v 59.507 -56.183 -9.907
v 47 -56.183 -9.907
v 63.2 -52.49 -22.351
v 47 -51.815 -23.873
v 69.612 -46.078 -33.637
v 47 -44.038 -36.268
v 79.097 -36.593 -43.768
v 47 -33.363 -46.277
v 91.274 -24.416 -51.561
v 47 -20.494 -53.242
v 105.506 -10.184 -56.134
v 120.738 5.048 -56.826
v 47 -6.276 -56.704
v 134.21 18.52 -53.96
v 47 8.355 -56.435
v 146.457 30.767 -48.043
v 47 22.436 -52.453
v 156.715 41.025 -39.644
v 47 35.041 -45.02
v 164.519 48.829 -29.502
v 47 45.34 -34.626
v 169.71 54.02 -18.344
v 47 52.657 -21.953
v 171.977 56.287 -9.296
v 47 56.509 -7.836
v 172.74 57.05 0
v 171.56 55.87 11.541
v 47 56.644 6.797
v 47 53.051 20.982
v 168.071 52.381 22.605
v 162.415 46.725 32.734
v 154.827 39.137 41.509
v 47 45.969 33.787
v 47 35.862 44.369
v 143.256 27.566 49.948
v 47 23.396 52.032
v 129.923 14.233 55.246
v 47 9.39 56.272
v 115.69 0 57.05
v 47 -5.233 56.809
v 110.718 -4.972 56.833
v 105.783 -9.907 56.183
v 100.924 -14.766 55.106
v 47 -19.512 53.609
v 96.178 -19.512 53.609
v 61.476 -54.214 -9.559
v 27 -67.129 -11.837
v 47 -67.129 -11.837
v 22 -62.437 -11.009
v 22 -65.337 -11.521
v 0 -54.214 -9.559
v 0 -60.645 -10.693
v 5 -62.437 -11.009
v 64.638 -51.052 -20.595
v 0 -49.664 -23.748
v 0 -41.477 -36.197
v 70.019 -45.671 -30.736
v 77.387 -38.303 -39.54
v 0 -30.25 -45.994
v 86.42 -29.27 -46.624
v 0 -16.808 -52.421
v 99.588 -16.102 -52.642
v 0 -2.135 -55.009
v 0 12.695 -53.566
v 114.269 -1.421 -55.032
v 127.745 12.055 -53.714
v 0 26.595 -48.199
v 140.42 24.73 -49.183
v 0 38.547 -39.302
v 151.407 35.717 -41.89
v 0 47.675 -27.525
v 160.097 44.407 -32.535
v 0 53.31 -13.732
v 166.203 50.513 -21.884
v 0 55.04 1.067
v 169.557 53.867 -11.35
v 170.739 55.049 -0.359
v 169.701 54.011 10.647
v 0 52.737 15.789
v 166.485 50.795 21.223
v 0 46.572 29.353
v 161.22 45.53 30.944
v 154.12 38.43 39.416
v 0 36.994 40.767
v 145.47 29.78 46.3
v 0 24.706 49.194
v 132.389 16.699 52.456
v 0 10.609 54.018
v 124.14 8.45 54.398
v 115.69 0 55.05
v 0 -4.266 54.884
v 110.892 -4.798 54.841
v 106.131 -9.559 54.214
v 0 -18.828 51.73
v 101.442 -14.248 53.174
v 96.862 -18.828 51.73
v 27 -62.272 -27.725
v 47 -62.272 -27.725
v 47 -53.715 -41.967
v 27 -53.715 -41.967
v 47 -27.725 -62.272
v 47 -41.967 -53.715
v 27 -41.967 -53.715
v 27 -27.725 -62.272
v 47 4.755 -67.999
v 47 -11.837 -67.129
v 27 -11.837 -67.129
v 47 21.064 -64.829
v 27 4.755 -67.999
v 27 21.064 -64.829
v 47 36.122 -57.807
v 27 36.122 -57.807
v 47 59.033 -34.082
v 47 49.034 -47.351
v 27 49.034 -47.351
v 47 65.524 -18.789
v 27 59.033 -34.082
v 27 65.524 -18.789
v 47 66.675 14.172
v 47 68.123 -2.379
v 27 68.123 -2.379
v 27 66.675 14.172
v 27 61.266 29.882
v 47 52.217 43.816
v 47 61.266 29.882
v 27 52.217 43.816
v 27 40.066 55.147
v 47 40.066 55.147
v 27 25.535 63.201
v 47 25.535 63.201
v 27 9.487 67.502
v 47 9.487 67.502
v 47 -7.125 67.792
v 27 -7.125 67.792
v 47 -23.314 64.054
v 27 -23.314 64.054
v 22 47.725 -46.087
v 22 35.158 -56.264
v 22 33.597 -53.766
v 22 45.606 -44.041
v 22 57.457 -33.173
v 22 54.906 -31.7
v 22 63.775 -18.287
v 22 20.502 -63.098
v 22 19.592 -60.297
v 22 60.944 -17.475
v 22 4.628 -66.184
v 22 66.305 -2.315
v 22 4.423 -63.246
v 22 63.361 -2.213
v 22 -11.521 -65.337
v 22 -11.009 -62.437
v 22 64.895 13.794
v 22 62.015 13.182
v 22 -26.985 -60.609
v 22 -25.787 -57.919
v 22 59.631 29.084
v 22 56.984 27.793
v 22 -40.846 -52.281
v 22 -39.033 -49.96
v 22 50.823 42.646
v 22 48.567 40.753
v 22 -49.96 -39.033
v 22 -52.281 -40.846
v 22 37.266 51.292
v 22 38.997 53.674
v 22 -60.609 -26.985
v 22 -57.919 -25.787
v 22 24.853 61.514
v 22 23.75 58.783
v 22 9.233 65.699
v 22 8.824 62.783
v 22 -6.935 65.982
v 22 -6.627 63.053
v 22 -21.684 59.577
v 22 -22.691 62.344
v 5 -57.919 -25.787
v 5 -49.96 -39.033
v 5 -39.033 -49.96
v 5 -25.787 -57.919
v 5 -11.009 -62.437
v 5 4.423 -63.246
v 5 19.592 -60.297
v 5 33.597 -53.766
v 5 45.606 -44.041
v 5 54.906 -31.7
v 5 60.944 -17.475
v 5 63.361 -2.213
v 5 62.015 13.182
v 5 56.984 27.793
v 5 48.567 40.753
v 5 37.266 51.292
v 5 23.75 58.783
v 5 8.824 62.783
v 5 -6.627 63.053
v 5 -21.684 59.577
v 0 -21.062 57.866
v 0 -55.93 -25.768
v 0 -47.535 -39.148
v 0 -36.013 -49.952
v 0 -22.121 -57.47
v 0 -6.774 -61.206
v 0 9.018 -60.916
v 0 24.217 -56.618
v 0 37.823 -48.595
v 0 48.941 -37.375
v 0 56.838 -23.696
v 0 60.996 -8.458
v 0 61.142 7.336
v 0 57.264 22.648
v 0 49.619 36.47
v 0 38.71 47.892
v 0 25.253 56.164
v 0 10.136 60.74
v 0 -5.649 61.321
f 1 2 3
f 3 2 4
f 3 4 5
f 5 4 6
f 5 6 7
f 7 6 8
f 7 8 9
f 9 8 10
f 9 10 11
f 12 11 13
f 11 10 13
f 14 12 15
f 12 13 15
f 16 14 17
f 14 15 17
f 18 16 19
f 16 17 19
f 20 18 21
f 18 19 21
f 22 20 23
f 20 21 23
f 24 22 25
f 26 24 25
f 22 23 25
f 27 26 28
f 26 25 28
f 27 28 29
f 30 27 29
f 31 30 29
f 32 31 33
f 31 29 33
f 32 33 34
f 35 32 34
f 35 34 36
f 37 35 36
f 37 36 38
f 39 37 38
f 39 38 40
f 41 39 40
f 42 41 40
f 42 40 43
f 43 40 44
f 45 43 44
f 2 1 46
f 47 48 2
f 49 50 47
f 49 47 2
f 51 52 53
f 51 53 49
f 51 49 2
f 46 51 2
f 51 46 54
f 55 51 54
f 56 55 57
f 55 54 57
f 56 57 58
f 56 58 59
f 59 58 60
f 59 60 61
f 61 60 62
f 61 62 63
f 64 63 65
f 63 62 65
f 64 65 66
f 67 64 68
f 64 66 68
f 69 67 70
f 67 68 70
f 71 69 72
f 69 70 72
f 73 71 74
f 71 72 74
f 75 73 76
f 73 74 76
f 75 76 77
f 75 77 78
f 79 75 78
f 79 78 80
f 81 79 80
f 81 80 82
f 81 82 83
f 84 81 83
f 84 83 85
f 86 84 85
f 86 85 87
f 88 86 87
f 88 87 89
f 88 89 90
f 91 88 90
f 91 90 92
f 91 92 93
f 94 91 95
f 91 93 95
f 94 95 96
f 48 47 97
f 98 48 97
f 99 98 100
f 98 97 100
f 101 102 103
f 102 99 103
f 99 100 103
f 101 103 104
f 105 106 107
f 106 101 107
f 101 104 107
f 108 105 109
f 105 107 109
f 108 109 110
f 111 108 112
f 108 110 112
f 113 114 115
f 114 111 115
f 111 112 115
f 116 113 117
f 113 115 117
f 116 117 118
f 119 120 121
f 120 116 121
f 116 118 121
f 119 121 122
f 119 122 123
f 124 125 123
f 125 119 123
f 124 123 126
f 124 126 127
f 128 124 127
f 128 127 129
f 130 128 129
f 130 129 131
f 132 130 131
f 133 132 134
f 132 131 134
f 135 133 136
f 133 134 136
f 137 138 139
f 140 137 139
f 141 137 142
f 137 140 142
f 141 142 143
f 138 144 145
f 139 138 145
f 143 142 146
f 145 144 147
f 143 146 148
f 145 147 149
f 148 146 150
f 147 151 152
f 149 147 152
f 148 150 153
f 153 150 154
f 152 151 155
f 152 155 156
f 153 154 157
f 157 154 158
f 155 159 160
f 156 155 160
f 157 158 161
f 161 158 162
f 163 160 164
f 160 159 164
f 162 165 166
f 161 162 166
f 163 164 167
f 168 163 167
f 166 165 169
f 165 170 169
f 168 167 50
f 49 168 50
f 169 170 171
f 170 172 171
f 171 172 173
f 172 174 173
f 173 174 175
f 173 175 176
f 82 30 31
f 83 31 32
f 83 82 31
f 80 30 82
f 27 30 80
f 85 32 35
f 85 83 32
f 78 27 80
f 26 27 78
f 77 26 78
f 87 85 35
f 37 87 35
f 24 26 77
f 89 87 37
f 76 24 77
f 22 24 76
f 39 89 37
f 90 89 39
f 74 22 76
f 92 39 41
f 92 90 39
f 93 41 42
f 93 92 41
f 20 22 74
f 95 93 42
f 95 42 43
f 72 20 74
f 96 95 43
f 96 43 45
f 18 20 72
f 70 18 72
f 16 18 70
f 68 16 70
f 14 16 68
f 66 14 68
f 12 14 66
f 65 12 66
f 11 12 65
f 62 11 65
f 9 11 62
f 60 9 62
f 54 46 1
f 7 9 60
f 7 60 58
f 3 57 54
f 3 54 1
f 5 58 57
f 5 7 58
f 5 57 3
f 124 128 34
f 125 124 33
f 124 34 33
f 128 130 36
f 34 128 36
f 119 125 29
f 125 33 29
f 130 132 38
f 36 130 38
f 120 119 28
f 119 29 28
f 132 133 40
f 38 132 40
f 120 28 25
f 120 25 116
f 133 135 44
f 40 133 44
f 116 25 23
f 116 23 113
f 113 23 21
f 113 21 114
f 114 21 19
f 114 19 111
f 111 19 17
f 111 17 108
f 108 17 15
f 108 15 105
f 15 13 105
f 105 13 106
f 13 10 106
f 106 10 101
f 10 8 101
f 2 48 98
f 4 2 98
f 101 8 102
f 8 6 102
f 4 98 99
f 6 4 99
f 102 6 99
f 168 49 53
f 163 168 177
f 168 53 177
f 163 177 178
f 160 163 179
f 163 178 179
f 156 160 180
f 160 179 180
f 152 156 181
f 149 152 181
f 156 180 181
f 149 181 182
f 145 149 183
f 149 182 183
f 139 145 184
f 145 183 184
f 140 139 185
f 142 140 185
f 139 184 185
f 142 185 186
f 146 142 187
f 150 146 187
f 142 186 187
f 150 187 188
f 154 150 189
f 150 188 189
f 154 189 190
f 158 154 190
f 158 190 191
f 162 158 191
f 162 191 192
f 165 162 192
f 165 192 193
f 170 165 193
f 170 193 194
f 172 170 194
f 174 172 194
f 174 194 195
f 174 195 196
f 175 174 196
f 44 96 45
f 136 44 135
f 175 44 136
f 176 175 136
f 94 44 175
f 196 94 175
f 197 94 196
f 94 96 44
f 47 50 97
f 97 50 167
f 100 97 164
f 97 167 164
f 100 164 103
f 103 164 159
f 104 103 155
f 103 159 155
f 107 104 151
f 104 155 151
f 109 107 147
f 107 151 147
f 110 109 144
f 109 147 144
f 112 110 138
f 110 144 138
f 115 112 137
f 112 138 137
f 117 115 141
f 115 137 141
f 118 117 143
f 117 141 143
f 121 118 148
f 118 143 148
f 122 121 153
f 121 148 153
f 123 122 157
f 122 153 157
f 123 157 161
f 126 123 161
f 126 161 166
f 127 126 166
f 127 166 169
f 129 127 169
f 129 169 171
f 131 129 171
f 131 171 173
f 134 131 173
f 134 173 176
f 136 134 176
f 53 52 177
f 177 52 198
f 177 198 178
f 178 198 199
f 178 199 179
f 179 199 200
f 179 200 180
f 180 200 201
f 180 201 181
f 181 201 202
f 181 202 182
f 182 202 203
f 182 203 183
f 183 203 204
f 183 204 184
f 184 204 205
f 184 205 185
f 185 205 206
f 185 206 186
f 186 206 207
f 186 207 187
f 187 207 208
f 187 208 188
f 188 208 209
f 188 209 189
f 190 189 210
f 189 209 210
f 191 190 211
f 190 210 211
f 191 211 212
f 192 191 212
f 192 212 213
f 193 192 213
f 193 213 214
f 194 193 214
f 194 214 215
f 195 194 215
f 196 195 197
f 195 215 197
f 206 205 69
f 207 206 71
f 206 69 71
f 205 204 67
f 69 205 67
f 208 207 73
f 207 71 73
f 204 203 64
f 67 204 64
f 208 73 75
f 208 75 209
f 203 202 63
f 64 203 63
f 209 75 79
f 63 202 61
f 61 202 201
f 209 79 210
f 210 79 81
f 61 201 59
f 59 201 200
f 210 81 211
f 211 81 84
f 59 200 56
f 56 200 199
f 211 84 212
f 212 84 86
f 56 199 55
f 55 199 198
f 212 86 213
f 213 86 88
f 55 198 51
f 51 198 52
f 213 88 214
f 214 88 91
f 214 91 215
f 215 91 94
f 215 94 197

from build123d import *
from OCP.BRepFilletAPI import BRepFilletAPI_MakeChamfer

# Parameters (mm, degrees)
CUT_EXTRUDE1_DEPTH      = 198.818204546
CUT_EXTRUDE1_DEPTH_BACK = 198.818204546
CHAMFER1_SIZE           = 5
CHAMFER1_SIZE2          = 1.819851171
CUT_EXTRUDE3_DEPTH      = 198.818204546
CUT_EXTRUDE3_DEPTH_BACK = 198.818204546


with BuildPart() as part:
    # Sketch1 → Revolve1 (revolve)
    with BuildSketch(Plane.XY):
        Polygon((0, 55.05), (172.74, 55.05), (172.74, 57.05), (47, 57.05), (47, 68.165), (22, 68.165), (22, 63.4), (0, 63.4), align=None)
    revolve(axis=Axis((0, 0, 0), (1, 0, 0)))

    # Sketch1<3> → Cut-Extrude1 (cut, two sides: drawn at the far end of the back side and taken through both)
    with BuildSketch(Plane.XY.offset(-CUT_EXTRUDE1_DEPTH_BACK)):
        Polygon((182.74, 67.05), (-17.26, -132.95), (182.74, -132.95), align=None)
    extrude(amount=CUT_EXTRUDE1_DEPTH + CUT_EXTRUDE1_DEPTH_BACK, mode=Mode.SUBTRACT)

    # Chamfer1: one chamfer whose edges measure the first distance from different faces: ONE call of the kernel's chamfer builder (chamfer() names one face for all edges)
    chamfer1_edges_1 = [part.edges().sort_by_distance(p)[0] for p in [
        (0, -63.4, 0),
    ]]
    chamfer1_side_1 = [part.faces().sort_by_distance(p)[0] for p in [
        (11, -63.4, 0),
    ]]
    chamfer1_edges_2 = [part.edges().sort_by_distance(p)[0] for p in [
        (22, -68.165, 0),
    ]]
    chamfer1_side_2 = [part.faces().sort_by_distance(p)[0] for p in [
        (34.5, -68.165, 0),
    ]]
    chamfer1 = BRepFilletAPI_MakeChamfer(part.part.solid().wrapped)
    for e in chamfer1_edges_1:
        chamfer1.Add(CHAMFER1_SIZE, CHAMFER1_SIZE2, e.wrapped, chamfer1_side_1[0].wrapped)  # the first distance lies on this face
    for e in chamfer1_edges_2:
        chamfer1.Add(CHAMFER1_SIZE, CHAMFER1_SIZE2, e.wrapped, chamfer1_side_2[0].wrapped)  # the first distance lies on this face
    add(Compound.cast(chamfer1.Shape()), mode=Mode.REPLACE)

    # Sketch2 → Cut-Extrude3 (cut, two sides: drawn at the far end of the back side and taken through both)
    with BuildSketch(Plane(origin=(0, 0, 0), x_dir=(0, 0, -1), z_dir=(1, 0, 0)).offset(-CUT_EXTRUDE3_DEPTH_BACK)):
        Polygon((0, 0), (-302.22251614, -110), (19.395967878, -110), align=None)
    extrude(amount=CUT_EXTRUDE3_DEPTH + CUT_EXTRUDE3_DEPTH_BACK, mode=Mode.SUBTRACT)


solid = part.part
